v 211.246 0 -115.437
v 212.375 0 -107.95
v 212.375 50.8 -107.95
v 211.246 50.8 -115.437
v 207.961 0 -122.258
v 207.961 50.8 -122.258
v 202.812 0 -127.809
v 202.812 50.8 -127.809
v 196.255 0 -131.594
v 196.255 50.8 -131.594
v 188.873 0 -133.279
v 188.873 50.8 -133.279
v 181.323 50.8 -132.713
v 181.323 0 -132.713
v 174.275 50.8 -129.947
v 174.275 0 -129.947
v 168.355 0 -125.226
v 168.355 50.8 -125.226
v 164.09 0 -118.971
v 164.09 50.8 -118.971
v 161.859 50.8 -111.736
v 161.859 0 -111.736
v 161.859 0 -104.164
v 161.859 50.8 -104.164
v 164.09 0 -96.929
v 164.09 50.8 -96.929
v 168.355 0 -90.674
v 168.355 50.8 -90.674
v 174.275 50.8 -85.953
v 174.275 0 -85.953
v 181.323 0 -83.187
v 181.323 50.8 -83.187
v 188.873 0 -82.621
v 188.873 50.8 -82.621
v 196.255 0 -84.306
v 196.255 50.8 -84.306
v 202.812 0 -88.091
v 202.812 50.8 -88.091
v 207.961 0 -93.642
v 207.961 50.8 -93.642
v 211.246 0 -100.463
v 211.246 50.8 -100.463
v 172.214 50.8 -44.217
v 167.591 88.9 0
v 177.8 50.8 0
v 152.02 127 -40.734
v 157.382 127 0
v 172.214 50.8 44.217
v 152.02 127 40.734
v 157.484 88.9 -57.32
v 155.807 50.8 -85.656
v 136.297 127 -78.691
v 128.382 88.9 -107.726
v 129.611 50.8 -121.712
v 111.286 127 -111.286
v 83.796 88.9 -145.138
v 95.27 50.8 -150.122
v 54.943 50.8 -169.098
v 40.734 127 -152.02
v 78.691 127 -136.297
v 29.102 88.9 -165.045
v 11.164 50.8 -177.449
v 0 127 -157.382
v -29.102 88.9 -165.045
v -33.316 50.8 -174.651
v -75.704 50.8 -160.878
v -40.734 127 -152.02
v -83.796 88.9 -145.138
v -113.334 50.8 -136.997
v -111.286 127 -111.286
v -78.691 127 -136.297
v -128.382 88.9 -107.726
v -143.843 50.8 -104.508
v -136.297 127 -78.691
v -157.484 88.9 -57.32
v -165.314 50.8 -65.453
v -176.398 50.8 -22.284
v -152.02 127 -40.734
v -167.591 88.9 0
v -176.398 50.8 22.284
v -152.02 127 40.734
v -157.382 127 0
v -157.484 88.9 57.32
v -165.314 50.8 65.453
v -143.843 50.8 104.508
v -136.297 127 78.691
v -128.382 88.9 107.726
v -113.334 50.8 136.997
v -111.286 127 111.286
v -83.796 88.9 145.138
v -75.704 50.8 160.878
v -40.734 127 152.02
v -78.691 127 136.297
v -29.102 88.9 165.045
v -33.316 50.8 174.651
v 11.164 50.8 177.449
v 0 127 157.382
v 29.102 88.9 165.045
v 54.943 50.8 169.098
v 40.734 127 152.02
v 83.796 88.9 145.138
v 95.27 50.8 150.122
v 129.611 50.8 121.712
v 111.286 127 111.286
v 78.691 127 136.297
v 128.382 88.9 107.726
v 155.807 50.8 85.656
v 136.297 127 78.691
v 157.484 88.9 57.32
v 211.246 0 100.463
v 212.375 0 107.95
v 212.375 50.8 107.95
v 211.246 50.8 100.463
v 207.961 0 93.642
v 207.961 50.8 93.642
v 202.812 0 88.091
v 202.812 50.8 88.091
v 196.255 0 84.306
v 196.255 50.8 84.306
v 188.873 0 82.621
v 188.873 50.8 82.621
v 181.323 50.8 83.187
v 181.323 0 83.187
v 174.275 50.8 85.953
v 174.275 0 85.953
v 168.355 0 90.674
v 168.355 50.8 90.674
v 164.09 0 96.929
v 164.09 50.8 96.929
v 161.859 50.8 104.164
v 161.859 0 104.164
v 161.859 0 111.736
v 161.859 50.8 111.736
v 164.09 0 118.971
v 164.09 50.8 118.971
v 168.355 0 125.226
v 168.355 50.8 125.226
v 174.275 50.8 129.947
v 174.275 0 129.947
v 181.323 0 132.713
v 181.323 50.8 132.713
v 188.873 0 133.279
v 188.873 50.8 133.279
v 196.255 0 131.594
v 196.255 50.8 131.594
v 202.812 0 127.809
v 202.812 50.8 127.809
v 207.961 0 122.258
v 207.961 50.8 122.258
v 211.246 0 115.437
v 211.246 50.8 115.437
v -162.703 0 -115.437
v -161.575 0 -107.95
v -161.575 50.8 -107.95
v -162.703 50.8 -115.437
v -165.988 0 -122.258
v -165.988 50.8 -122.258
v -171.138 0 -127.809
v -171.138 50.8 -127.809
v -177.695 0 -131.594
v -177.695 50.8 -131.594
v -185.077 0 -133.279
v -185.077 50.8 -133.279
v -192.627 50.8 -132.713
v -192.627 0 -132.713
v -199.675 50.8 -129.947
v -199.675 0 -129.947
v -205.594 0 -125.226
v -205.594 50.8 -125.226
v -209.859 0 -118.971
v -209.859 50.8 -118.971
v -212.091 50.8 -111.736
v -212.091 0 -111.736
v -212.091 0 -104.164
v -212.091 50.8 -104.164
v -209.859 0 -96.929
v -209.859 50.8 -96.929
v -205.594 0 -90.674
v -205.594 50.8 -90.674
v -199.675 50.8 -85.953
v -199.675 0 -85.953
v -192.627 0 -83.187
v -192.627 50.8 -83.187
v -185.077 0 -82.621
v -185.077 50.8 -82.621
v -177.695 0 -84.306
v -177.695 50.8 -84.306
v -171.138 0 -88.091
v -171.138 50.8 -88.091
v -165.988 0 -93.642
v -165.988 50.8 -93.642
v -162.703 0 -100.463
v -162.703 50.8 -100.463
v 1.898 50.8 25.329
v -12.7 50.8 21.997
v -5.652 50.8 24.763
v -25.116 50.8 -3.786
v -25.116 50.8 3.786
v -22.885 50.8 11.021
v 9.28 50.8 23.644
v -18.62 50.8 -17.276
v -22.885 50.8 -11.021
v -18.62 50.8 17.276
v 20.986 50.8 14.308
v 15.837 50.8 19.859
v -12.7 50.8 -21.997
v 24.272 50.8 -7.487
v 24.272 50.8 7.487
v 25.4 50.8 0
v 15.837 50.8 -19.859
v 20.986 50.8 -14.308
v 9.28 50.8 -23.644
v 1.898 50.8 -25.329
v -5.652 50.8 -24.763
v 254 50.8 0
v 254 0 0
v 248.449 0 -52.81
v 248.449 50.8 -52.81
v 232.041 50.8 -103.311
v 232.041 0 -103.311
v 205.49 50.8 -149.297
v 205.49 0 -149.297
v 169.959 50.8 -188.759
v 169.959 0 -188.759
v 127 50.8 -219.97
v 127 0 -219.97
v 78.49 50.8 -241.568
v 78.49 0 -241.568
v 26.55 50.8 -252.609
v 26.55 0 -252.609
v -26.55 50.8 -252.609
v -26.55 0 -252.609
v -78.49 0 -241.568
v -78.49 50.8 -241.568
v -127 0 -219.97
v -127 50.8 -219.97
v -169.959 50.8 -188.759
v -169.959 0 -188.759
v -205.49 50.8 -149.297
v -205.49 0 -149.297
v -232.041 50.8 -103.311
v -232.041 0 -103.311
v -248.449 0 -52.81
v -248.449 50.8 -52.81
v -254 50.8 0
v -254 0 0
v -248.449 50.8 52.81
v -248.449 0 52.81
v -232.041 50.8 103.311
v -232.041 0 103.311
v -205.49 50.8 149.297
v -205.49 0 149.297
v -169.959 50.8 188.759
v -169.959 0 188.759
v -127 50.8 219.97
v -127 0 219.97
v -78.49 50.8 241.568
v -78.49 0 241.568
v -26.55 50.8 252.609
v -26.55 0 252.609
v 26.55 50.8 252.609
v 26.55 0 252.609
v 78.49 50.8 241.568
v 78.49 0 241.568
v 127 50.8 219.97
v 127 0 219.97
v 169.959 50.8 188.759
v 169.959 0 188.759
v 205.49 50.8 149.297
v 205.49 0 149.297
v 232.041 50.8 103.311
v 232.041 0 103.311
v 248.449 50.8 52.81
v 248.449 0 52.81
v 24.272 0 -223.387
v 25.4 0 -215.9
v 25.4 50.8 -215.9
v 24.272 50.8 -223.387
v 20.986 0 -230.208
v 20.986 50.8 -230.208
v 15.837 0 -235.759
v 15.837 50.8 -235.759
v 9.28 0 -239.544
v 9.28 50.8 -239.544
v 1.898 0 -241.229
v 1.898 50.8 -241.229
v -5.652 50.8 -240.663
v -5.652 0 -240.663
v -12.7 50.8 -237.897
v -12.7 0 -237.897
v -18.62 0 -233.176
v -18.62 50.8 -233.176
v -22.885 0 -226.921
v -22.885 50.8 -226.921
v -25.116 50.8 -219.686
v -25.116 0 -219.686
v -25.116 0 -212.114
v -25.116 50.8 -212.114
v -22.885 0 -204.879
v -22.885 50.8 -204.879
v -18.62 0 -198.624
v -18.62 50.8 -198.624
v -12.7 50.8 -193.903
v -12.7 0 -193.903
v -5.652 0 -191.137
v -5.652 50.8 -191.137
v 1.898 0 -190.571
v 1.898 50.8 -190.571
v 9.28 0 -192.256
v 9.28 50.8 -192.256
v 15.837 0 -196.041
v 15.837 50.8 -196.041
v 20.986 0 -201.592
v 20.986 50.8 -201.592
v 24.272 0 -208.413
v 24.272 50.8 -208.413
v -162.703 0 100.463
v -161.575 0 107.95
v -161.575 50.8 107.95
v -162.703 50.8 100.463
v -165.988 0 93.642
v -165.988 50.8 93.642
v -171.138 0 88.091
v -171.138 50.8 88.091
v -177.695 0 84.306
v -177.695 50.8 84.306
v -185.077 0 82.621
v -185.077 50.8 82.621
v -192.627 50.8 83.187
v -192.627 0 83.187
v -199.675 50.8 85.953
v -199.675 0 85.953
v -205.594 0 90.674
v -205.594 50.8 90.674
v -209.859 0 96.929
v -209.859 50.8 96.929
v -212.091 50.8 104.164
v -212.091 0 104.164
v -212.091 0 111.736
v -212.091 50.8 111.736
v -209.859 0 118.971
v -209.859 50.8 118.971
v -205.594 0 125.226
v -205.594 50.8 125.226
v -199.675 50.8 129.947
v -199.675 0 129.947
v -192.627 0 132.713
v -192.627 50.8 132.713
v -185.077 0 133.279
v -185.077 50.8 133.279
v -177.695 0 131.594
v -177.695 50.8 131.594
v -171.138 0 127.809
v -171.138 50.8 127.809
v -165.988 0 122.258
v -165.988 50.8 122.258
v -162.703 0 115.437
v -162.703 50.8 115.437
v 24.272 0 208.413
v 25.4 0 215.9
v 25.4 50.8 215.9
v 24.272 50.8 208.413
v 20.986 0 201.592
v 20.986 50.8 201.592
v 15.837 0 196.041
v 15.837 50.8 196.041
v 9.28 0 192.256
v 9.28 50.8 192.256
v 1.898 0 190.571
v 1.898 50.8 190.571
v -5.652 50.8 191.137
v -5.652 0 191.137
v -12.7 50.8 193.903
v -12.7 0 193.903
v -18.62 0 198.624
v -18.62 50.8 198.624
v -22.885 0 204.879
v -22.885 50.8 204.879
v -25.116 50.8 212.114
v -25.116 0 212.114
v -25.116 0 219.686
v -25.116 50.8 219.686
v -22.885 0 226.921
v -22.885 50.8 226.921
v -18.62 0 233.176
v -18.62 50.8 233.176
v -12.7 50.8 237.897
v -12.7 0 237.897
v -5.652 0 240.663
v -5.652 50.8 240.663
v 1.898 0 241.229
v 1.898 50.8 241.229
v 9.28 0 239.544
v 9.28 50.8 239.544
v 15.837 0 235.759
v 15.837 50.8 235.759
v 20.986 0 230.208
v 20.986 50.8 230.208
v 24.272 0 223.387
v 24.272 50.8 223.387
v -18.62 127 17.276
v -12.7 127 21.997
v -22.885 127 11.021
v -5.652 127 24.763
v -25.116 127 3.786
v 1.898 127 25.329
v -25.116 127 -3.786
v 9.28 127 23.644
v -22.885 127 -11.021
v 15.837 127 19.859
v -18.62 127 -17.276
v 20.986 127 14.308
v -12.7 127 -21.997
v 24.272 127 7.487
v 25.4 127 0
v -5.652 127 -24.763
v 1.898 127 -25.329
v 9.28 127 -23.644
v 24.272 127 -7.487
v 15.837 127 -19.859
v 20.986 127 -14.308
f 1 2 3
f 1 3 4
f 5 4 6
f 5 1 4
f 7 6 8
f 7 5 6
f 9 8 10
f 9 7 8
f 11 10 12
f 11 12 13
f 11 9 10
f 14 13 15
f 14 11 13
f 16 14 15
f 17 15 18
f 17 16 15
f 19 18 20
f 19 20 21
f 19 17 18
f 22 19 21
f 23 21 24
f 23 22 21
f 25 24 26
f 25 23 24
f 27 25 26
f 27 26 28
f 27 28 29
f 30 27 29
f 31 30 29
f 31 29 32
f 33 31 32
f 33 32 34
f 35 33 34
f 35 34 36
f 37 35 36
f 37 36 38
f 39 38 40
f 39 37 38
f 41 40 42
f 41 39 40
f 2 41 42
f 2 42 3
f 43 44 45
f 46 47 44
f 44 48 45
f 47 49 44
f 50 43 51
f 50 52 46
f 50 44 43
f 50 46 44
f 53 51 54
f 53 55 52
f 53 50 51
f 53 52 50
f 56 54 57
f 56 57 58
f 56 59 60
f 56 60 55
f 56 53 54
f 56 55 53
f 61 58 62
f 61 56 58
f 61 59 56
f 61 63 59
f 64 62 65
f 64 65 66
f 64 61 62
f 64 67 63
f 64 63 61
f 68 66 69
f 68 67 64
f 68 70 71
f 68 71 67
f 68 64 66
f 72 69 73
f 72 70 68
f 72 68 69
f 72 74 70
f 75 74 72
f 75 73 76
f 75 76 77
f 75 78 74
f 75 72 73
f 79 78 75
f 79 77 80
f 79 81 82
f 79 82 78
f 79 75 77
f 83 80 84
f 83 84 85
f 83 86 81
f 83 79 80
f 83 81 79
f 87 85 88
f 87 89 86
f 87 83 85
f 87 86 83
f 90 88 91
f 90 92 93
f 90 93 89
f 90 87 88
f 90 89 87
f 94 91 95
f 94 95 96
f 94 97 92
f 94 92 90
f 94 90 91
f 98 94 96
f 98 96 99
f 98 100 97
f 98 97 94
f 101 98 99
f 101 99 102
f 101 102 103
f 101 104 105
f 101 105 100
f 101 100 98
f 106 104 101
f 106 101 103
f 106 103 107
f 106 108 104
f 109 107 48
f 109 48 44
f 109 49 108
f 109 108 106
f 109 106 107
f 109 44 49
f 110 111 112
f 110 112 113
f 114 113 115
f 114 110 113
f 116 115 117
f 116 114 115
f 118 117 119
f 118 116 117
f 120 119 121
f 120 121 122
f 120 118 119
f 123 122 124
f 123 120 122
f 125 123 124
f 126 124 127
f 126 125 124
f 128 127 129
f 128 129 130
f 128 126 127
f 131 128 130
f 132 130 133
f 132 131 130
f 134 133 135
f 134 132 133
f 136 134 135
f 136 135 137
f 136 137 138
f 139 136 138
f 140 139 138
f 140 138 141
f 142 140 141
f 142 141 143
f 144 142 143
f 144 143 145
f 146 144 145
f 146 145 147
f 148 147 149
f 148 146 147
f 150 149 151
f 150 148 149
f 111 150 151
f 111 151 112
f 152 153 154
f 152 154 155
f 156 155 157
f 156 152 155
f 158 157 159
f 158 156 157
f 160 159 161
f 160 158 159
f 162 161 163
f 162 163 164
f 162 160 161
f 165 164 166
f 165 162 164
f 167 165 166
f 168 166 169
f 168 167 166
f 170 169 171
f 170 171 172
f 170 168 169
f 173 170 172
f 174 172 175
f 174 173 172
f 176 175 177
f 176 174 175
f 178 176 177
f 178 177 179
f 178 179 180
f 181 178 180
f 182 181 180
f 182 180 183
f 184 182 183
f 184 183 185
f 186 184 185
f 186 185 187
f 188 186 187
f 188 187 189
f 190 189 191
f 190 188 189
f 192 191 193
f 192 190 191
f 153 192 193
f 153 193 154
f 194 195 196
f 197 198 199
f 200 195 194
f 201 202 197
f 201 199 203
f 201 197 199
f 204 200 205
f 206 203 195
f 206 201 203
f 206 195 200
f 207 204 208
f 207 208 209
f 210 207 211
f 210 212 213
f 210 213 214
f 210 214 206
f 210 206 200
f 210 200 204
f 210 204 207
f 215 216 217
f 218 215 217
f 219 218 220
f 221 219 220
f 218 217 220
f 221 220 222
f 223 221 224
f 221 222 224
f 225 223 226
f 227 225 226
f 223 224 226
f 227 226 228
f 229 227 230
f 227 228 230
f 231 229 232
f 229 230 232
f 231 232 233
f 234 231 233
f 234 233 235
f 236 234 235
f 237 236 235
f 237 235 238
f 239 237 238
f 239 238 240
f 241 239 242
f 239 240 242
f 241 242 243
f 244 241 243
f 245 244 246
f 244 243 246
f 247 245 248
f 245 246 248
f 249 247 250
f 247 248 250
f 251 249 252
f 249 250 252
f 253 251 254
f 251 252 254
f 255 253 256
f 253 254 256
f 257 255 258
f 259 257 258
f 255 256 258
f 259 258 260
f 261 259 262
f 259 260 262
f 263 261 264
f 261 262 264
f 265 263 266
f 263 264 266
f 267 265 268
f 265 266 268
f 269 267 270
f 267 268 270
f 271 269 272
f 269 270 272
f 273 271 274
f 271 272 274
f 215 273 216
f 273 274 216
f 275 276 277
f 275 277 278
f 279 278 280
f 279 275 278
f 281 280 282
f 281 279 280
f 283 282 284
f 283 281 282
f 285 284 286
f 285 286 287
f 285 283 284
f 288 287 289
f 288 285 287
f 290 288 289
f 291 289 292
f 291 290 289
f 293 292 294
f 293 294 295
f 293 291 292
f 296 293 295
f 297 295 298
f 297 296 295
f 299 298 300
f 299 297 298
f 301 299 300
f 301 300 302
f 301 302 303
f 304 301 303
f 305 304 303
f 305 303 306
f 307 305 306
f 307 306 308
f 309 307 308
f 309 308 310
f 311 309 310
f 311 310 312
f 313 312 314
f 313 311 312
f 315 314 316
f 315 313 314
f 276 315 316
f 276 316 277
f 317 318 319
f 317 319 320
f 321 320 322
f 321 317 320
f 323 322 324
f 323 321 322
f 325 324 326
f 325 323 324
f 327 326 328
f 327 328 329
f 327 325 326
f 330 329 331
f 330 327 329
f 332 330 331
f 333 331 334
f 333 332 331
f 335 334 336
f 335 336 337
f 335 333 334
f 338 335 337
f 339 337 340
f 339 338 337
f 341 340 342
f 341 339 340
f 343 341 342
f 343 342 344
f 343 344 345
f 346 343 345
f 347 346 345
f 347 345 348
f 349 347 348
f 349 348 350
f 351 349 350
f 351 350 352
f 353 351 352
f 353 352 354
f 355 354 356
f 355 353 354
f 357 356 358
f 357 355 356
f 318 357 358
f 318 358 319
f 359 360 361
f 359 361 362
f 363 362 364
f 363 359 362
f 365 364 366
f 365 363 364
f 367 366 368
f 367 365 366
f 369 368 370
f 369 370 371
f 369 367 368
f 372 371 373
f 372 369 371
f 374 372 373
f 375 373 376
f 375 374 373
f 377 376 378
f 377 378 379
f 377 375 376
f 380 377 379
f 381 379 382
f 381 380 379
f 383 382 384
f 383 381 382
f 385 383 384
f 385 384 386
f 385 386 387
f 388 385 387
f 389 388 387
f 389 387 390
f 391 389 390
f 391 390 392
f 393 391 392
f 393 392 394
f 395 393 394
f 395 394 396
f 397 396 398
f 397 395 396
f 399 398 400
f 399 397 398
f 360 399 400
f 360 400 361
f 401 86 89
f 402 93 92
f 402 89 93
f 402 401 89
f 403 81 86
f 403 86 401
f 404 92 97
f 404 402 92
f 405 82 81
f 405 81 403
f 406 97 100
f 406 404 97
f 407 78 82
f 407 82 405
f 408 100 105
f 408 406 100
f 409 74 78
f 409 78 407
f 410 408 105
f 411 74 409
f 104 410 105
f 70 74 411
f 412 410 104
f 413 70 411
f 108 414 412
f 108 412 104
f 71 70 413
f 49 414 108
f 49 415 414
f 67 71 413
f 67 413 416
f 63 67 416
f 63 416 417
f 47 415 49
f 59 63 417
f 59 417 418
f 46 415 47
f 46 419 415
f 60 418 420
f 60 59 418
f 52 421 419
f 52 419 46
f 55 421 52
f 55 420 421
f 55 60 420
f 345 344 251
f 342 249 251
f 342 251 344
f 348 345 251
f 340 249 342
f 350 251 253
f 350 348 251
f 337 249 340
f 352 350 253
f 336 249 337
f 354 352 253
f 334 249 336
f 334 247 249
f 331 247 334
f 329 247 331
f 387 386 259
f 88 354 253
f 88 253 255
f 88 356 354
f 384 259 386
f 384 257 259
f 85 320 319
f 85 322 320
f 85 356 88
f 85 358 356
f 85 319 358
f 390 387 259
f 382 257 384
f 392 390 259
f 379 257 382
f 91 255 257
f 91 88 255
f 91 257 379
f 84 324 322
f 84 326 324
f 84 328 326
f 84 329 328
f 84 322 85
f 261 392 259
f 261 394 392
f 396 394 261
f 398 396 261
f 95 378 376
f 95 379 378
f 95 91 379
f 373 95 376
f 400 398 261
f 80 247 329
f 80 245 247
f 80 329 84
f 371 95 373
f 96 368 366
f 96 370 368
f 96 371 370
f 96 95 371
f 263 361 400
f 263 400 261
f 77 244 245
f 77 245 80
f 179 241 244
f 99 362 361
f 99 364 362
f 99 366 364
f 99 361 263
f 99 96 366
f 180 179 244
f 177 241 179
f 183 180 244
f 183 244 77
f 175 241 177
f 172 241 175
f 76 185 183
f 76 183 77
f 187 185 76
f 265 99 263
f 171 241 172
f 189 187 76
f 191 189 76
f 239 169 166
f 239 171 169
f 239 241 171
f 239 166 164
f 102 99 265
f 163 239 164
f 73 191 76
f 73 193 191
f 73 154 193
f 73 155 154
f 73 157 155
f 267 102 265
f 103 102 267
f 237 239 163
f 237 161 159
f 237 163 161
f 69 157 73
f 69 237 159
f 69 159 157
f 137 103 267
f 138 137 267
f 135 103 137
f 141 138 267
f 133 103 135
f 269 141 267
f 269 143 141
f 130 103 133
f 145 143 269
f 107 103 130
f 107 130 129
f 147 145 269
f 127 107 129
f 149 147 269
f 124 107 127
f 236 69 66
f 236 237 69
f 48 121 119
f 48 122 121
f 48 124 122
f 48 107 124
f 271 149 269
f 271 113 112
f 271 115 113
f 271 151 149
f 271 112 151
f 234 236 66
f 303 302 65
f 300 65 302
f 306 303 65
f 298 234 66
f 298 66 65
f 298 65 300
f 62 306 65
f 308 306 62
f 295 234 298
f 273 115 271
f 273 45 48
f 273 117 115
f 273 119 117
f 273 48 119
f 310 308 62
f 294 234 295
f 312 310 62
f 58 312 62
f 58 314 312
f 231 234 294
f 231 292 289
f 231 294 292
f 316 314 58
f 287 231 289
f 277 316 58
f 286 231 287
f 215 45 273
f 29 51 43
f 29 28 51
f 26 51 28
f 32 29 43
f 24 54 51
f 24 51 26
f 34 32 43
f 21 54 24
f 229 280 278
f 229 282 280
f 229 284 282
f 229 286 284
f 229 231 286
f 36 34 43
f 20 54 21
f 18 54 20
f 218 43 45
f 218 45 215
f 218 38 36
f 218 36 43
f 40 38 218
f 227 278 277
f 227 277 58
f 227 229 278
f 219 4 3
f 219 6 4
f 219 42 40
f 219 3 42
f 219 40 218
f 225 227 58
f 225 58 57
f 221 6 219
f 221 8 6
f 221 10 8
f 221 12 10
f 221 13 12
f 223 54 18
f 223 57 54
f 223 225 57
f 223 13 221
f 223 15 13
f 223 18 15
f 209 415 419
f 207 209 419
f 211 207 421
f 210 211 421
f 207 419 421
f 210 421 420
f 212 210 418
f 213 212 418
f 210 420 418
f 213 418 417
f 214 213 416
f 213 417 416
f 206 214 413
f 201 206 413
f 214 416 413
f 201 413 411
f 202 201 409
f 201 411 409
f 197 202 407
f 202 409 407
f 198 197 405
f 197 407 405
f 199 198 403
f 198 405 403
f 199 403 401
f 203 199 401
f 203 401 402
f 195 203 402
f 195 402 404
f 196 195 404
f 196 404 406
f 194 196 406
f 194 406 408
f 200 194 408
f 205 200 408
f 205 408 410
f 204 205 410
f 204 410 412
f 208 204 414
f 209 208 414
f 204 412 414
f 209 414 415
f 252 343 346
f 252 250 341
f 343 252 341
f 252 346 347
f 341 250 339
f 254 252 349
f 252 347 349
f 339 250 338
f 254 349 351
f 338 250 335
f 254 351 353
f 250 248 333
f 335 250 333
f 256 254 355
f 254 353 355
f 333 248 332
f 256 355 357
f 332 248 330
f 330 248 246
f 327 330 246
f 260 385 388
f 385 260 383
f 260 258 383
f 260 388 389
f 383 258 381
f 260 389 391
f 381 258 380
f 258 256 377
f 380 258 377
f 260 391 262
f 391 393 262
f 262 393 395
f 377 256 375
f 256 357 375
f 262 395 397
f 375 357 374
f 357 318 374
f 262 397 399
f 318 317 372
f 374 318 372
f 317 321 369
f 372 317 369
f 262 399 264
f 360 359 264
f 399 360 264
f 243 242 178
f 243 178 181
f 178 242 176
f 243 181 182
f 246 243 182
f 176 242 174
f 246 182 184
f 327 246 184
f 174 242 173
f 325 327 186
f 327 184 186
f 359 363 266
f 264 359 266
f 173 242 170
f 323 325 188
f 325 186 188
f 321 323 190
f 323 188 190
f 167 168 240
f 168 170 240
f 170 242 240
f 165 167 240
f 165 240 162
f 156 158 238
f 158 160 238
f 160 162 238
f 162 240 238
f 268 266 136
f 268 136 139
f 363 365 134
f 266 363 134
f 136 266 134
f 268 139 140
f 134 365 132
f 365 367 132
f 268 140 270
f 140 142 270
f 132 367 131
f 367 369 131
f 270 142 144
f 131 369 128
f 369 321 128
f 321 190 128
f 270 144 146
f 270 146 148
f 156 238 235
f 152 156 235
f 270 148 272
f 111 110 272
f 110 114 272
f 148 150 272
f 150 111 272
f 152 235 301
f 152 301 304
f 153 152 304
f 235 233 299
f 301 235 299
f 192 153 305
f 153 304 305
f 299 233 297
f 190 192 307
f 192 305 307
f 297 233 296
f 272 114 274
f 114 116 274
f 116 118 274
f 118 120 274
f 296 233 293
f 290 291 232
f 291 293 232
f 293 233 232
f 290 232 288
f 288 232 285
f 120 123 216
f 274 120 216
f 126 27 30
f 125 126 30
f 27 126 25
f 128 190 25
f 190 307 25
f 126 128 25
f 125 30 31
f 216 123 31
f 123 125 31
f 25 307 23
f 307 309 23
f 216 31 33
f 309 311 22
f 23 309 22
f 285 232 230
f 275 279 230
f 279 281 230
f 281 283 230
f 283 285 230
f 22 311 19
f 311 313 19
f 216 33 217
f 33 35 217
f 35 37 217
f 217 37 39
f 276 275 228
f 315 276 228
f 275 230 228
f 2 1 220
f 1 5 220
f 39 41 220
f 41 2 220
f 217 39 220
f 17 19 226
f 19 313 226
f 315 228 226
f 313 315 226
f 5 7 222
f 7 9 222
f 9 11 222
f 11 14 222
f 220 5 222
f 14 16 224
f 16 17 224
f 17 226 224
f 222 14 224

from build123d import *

# Parameters (mm, degrees)
SKETCH2_R           = 254
SKETCH2_R_2         = 25.4
BOSS_EXTRUDE2_DEPTH = 50.8
SKETCH3_R           = 177.8
BOSS_EXTRUDE3_DEPTH = 76.2
BOSS_EXTRUDE3_TAPER = 15
SKETCH4_R           = 25.4
CUT_EXTRUDE1_DEPTH  = 76.2


with BuildPart() as part:
    # Sketch2 → Boss-Extrude2 (new body)
    with BuildSketch(Plane(origin=(0, 0, 0), x_dir=(1, 0, 0), z_dir=(0, 1, 0))):
        Circle(SKETCH2_R)
        with Locations((0, 215.9)):
            Circle(SKETCH2_R_2, mode=Mode.SUBTRACT)
        with Locations((186.974884677, 107.95)):
            Circle(SKETCH2_R_2, mode=Mode.SUBTRACT)
        with Locations((186.974884677, -107.95)):
            Circle(SKETCH2_R_2, mode=Mode.SUBTRACT)
        with Locations((0, -215.9)):
            Circle(SKETCH2_R_2, mode=Mode.SUBTRACT)
        with Locations((-186.974884677, -107.95)):
            Circle(SKETCH2_R_2, mode=Mode.SUBTRACT)
        with Locations((-186.974884677, 107.95)):
            Circle(SKETCH2_R_2, mode=Mode.SUBTRACT)
    extrude(amount=BOSS_EXTRUDE2_DEPTH)

    # Sketch3 → Boss-Extrude3 (add)
    with BuildSketch(Plane(origin=(0, 50.8, 0), x_dir=(1, 0, 0), z_dir=(0, 1, 0))):
        Circle(SKETCH3_R)
    extrude(amount=BOSS_EXTRUDE3_DEPTH, taper=BOSS_EXTRUDE3_TAPER)

    # Sketch4 → Cut-Extrude1 (cut)
    with BuildSketch(Plane(origin=(0, 127, 0), x_dir=(1, 0, 0), z_dir=(0, 1, 0))):
        Circle(SKETCH4_R)
    extrude(amount=-CUT_EXTRUDE1_DEPTH, mode=Mode.SUBTRACT)


solid = part.part
